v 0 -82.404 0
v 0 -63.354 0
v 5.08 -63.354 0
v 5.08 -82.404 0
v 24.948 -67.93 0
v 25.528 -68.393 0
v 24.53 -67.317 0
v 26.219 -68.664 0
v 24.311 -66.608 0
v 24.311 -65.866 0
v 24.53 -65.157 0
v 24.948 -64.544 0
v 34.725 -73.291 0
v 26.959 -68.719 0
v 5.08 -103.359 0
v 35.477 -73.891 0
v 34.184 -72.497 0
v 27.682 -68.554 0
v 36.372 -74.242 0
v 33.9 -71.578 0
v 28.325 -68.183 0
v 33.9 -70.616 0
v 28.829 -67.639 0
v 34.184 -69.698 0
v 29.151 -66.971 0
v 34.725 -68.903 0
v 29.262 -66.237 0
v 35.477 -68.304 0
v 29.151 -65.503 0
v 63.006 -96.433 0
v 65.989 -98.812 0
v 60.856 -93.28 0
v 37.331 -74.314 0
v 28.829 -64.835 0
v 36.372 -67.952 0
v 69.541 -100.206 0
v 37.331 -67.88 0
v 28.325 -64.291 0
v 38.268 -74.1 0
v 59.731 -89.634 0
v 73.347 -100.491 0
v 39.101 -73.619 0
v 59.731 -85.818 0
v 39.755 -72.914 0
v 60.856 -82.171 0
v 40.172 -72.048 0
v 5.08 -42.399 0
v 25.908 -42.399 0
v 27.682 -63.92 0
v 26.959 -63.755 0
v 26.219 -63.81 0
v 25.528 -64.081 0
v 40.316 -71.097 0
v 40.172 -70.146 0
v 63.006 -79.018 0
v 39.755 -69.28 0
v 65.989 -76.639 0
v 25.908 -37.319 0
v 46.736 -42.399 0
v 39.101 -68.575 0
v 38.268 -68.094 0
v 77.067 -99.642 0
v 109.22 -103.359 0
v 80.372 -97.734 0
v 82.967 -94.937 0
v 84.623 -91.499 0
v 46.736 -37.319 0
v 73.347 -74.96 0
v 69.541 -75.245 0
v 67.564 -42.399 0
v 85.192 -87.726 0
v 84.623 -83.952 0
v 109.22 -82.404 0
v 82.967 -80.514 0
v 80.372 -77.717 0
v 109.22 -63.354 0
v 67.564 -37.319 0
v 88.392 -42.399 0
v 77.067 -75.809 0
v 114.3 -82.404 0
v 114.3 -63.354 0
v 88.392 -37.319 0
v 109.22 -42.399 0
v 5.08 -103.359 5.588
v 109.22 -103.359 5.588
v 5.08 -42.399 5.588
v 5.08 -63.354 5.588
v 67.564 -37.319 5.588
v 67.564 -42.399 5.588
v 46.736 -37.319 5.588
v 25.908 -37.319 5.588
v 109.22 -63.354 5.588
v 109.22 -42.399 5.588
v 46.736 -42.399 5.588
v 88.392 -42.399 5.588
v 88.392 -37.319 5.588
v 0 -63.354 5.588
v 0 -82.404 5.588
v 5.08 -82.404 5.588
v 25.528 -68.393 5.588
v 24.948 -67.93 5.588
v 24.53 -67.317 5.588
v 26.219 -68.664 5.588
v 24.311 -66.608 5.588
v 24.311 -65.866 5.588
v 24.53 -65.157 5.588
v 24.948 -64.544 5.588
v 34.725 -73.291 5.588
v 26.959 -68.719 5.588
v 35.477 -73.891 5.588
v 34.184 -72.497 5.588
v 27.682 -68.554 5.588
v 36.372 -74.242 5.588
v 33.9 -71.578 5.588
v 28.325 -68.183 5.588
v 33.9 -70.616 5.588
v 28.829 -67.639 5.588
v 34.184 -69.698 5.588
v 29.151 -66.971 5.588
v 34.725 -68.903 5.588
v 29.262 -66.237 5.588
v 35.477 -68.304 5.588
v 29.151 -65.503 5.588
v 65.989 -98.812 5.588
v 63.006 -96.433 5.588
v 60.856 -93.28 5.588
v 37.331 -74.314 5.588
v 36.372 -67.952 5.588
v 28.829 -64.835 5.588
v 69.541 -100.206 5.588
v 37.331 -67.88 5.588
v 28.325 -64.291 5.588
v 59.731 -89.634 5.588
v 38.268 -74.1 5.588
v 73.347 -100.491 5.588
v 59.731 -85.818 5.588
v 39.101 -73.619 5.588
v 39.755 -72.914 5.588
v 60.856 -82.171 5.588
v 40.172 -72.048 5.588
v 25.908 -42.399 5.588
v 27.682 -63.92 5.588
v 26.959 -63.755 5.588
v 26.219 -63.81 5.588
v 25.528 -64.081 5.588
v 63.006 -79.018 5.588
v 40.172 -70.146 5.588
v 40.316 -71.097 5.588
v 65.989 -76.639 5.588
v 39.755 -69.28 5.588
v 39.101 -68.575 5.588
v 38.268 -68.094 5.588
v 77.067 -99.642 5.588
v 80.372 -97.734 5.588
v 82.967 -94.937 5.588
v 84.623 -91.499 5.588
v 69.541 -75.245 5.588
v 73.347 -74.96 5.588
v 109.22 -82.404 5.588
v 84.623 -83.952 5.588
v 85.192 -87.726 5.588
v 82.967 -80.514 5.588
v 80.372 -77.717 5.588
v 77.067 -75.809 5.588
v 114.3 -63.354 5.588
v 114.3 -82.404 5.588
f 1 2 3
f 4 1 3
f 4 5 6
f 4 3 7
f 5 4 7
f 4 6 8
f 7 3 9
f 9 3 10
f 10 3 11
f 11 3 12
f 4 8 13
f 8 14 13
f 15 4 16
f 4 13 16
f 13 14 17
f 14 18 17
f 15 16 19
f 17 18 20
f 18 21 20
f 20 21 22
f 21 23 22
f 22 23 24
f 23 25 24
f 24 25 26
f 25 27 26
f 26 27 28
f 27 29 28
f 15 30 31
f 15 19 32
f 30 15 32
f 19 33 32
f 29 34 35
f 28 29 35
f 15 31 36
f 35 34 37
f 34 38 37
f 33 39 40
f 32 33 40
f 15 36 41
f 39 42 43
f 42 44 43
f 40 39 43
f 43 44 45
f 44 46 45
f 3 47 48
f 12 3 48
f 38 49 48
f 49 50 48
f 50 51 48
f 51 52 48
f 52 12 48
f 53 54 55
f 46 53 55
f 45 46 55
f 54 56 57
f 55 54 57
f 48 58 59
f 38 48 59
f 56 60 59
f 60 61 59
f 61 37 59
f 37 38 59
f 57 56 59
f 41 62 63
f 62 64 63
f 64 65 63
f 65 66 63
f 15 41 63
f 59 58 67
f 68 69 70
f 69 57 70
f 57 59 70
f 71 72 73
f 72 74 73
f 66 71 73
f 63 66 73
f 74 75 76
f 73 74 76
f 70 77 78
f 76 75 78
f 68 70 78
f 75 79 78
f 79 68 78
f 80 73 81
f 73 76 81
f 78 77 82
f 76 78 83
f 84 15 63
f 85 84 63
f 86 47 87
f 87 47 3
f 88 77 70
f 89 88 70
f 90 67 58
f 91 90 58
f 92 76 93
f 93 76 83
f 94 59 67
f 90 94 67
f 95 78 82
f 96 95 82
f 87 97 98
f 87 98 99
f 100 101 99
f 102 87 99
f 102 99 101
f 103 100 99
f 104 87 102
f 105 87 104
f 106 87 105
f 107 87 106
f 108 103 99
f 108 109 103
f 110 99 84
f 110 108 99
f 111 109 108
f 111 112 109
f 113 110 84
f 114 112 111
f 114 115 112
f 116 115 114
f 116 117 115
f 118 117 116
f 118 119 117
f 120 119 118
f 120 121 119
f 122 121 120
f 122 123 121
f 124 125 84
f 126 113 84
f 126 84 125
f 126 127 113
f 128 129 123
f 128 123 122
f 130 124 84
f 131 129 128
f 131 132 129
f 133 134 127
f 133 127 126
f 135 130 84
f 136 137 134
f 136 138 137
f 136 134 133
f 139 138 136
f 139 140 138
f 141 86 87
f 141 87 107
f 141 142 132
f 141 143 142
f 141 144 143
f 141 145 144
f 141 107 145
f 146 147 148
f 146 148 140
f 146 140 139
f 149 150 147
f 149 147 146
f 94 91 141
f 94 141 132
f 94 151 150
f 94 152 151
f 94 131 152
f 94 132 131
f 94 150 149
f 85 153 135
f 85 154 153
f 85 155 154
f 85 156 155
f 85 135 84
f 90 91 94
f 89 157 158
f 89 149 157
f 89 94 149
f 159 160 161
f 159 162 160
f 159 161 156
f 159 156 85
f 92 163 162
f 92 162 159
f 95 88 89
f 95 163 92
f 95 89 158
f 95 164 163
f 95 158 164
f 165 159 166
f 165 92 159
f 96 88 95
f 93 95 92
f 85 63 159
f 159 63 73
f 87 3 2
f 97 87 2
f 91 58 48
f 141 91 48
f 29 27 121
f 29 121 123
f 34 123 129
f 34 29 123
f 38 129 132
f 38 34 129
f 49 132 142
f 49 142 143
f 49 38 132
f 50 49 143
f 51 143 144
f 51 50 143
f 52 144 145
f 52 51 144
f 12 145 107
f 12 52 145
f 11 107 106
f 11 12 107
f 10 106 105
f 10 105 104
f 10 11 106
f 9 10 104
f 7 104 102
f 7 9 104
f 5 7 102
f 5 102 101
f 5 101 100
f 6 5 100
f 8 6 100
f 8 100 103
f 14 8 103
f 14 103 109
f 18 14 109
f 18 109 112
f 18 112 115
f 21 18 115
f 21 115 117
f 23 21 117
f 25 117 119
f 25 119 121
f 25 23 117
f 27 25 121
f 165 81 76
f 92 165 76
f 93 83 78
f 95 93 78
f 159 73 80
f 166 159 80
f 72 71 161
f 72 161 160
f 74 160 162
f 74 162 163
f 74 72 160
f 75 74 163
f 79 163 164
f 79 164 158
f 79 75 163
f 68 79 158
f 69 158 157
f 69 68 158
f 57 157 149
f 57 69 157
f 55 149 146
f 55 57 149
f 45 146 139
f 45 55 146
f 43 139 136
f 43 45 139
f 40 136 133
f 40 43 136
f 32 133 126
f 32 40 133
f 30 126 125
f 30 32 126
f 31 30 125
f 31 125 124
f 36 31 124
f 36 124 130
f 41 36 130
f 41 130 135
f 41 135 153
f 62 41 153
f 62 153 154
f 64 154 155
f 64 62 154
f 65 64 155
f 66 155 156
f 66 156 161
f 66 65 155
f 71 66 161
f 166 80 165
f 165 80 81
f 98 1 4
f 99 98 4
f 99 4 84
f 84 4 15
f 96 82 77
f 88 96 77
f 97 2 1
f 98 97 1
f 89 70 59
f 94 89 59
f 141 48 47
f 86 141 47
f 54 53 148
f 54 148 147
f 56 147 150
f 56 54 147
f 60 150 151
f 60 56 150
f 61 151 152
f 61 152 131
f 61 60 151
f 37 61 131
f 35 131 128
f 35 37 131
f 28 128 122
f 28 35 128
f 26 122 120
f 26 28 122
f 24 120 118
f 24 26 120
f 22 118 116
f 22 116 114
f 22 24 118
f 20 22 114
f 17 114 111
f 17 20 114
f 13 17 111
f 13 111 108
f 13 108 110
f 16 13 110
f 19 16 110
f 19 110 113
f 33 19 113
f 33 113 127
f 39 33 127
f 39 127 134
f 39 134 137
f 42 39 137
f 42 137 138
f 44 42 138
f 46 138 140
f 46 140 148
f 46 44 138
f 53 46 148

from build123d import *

# Parameters (mm, degrees)
SKETCH1_R           = 2.489200007
SKETCH1_R_2         = 3.225800007
SKETCH1_R_3         = 12.801600005
BOSS_EXTRUDE1_DEPTH = 5.588


with BuildPart() as part:
    # Sketch1 → Boss-Extrude1 (new body)
    with BuildSketch(Plane.XY):
        Polygon((5.08, -82.404335154), (5.08, -103.359335154), (109.22, -103.359335154), (109.22, -82.404335154), (114.3, -82.404335154), (114.3, -63.354335154), (109.22, -63.354335154), (109.22, -42.399335154), (88.392, -42.399335154), (88.392, -37.319335154), (67.564, -37.319335154), (67.564, -42.399335154), (46.736, -42.399335154), (46.736, -37.319335154), (25.908, -37.319335154), (25.908, -42.399335154), (5.08, -42.399335154), (5.08, -63.354335154), (0, -63.354335154), (0, -82.404335154), align=None)
        with Locations((26.772733885, -66.237193374)):
            Circle(SKETCH1_R, mode=Mode.SUBTRACT)
        with Locations((37.089955672, -71.097217628)):
            Circle(SKETCH1_R_2, mode=Mode.SUBTRACT)
        with Locations((72.39, -87.725635154)):
            Circle(SKETCH1_R_3, mode=Mode.SUBTRACT)
    extrude(amount=BOSS_EXTRUDE1_DEPTH)


solid = part.part
